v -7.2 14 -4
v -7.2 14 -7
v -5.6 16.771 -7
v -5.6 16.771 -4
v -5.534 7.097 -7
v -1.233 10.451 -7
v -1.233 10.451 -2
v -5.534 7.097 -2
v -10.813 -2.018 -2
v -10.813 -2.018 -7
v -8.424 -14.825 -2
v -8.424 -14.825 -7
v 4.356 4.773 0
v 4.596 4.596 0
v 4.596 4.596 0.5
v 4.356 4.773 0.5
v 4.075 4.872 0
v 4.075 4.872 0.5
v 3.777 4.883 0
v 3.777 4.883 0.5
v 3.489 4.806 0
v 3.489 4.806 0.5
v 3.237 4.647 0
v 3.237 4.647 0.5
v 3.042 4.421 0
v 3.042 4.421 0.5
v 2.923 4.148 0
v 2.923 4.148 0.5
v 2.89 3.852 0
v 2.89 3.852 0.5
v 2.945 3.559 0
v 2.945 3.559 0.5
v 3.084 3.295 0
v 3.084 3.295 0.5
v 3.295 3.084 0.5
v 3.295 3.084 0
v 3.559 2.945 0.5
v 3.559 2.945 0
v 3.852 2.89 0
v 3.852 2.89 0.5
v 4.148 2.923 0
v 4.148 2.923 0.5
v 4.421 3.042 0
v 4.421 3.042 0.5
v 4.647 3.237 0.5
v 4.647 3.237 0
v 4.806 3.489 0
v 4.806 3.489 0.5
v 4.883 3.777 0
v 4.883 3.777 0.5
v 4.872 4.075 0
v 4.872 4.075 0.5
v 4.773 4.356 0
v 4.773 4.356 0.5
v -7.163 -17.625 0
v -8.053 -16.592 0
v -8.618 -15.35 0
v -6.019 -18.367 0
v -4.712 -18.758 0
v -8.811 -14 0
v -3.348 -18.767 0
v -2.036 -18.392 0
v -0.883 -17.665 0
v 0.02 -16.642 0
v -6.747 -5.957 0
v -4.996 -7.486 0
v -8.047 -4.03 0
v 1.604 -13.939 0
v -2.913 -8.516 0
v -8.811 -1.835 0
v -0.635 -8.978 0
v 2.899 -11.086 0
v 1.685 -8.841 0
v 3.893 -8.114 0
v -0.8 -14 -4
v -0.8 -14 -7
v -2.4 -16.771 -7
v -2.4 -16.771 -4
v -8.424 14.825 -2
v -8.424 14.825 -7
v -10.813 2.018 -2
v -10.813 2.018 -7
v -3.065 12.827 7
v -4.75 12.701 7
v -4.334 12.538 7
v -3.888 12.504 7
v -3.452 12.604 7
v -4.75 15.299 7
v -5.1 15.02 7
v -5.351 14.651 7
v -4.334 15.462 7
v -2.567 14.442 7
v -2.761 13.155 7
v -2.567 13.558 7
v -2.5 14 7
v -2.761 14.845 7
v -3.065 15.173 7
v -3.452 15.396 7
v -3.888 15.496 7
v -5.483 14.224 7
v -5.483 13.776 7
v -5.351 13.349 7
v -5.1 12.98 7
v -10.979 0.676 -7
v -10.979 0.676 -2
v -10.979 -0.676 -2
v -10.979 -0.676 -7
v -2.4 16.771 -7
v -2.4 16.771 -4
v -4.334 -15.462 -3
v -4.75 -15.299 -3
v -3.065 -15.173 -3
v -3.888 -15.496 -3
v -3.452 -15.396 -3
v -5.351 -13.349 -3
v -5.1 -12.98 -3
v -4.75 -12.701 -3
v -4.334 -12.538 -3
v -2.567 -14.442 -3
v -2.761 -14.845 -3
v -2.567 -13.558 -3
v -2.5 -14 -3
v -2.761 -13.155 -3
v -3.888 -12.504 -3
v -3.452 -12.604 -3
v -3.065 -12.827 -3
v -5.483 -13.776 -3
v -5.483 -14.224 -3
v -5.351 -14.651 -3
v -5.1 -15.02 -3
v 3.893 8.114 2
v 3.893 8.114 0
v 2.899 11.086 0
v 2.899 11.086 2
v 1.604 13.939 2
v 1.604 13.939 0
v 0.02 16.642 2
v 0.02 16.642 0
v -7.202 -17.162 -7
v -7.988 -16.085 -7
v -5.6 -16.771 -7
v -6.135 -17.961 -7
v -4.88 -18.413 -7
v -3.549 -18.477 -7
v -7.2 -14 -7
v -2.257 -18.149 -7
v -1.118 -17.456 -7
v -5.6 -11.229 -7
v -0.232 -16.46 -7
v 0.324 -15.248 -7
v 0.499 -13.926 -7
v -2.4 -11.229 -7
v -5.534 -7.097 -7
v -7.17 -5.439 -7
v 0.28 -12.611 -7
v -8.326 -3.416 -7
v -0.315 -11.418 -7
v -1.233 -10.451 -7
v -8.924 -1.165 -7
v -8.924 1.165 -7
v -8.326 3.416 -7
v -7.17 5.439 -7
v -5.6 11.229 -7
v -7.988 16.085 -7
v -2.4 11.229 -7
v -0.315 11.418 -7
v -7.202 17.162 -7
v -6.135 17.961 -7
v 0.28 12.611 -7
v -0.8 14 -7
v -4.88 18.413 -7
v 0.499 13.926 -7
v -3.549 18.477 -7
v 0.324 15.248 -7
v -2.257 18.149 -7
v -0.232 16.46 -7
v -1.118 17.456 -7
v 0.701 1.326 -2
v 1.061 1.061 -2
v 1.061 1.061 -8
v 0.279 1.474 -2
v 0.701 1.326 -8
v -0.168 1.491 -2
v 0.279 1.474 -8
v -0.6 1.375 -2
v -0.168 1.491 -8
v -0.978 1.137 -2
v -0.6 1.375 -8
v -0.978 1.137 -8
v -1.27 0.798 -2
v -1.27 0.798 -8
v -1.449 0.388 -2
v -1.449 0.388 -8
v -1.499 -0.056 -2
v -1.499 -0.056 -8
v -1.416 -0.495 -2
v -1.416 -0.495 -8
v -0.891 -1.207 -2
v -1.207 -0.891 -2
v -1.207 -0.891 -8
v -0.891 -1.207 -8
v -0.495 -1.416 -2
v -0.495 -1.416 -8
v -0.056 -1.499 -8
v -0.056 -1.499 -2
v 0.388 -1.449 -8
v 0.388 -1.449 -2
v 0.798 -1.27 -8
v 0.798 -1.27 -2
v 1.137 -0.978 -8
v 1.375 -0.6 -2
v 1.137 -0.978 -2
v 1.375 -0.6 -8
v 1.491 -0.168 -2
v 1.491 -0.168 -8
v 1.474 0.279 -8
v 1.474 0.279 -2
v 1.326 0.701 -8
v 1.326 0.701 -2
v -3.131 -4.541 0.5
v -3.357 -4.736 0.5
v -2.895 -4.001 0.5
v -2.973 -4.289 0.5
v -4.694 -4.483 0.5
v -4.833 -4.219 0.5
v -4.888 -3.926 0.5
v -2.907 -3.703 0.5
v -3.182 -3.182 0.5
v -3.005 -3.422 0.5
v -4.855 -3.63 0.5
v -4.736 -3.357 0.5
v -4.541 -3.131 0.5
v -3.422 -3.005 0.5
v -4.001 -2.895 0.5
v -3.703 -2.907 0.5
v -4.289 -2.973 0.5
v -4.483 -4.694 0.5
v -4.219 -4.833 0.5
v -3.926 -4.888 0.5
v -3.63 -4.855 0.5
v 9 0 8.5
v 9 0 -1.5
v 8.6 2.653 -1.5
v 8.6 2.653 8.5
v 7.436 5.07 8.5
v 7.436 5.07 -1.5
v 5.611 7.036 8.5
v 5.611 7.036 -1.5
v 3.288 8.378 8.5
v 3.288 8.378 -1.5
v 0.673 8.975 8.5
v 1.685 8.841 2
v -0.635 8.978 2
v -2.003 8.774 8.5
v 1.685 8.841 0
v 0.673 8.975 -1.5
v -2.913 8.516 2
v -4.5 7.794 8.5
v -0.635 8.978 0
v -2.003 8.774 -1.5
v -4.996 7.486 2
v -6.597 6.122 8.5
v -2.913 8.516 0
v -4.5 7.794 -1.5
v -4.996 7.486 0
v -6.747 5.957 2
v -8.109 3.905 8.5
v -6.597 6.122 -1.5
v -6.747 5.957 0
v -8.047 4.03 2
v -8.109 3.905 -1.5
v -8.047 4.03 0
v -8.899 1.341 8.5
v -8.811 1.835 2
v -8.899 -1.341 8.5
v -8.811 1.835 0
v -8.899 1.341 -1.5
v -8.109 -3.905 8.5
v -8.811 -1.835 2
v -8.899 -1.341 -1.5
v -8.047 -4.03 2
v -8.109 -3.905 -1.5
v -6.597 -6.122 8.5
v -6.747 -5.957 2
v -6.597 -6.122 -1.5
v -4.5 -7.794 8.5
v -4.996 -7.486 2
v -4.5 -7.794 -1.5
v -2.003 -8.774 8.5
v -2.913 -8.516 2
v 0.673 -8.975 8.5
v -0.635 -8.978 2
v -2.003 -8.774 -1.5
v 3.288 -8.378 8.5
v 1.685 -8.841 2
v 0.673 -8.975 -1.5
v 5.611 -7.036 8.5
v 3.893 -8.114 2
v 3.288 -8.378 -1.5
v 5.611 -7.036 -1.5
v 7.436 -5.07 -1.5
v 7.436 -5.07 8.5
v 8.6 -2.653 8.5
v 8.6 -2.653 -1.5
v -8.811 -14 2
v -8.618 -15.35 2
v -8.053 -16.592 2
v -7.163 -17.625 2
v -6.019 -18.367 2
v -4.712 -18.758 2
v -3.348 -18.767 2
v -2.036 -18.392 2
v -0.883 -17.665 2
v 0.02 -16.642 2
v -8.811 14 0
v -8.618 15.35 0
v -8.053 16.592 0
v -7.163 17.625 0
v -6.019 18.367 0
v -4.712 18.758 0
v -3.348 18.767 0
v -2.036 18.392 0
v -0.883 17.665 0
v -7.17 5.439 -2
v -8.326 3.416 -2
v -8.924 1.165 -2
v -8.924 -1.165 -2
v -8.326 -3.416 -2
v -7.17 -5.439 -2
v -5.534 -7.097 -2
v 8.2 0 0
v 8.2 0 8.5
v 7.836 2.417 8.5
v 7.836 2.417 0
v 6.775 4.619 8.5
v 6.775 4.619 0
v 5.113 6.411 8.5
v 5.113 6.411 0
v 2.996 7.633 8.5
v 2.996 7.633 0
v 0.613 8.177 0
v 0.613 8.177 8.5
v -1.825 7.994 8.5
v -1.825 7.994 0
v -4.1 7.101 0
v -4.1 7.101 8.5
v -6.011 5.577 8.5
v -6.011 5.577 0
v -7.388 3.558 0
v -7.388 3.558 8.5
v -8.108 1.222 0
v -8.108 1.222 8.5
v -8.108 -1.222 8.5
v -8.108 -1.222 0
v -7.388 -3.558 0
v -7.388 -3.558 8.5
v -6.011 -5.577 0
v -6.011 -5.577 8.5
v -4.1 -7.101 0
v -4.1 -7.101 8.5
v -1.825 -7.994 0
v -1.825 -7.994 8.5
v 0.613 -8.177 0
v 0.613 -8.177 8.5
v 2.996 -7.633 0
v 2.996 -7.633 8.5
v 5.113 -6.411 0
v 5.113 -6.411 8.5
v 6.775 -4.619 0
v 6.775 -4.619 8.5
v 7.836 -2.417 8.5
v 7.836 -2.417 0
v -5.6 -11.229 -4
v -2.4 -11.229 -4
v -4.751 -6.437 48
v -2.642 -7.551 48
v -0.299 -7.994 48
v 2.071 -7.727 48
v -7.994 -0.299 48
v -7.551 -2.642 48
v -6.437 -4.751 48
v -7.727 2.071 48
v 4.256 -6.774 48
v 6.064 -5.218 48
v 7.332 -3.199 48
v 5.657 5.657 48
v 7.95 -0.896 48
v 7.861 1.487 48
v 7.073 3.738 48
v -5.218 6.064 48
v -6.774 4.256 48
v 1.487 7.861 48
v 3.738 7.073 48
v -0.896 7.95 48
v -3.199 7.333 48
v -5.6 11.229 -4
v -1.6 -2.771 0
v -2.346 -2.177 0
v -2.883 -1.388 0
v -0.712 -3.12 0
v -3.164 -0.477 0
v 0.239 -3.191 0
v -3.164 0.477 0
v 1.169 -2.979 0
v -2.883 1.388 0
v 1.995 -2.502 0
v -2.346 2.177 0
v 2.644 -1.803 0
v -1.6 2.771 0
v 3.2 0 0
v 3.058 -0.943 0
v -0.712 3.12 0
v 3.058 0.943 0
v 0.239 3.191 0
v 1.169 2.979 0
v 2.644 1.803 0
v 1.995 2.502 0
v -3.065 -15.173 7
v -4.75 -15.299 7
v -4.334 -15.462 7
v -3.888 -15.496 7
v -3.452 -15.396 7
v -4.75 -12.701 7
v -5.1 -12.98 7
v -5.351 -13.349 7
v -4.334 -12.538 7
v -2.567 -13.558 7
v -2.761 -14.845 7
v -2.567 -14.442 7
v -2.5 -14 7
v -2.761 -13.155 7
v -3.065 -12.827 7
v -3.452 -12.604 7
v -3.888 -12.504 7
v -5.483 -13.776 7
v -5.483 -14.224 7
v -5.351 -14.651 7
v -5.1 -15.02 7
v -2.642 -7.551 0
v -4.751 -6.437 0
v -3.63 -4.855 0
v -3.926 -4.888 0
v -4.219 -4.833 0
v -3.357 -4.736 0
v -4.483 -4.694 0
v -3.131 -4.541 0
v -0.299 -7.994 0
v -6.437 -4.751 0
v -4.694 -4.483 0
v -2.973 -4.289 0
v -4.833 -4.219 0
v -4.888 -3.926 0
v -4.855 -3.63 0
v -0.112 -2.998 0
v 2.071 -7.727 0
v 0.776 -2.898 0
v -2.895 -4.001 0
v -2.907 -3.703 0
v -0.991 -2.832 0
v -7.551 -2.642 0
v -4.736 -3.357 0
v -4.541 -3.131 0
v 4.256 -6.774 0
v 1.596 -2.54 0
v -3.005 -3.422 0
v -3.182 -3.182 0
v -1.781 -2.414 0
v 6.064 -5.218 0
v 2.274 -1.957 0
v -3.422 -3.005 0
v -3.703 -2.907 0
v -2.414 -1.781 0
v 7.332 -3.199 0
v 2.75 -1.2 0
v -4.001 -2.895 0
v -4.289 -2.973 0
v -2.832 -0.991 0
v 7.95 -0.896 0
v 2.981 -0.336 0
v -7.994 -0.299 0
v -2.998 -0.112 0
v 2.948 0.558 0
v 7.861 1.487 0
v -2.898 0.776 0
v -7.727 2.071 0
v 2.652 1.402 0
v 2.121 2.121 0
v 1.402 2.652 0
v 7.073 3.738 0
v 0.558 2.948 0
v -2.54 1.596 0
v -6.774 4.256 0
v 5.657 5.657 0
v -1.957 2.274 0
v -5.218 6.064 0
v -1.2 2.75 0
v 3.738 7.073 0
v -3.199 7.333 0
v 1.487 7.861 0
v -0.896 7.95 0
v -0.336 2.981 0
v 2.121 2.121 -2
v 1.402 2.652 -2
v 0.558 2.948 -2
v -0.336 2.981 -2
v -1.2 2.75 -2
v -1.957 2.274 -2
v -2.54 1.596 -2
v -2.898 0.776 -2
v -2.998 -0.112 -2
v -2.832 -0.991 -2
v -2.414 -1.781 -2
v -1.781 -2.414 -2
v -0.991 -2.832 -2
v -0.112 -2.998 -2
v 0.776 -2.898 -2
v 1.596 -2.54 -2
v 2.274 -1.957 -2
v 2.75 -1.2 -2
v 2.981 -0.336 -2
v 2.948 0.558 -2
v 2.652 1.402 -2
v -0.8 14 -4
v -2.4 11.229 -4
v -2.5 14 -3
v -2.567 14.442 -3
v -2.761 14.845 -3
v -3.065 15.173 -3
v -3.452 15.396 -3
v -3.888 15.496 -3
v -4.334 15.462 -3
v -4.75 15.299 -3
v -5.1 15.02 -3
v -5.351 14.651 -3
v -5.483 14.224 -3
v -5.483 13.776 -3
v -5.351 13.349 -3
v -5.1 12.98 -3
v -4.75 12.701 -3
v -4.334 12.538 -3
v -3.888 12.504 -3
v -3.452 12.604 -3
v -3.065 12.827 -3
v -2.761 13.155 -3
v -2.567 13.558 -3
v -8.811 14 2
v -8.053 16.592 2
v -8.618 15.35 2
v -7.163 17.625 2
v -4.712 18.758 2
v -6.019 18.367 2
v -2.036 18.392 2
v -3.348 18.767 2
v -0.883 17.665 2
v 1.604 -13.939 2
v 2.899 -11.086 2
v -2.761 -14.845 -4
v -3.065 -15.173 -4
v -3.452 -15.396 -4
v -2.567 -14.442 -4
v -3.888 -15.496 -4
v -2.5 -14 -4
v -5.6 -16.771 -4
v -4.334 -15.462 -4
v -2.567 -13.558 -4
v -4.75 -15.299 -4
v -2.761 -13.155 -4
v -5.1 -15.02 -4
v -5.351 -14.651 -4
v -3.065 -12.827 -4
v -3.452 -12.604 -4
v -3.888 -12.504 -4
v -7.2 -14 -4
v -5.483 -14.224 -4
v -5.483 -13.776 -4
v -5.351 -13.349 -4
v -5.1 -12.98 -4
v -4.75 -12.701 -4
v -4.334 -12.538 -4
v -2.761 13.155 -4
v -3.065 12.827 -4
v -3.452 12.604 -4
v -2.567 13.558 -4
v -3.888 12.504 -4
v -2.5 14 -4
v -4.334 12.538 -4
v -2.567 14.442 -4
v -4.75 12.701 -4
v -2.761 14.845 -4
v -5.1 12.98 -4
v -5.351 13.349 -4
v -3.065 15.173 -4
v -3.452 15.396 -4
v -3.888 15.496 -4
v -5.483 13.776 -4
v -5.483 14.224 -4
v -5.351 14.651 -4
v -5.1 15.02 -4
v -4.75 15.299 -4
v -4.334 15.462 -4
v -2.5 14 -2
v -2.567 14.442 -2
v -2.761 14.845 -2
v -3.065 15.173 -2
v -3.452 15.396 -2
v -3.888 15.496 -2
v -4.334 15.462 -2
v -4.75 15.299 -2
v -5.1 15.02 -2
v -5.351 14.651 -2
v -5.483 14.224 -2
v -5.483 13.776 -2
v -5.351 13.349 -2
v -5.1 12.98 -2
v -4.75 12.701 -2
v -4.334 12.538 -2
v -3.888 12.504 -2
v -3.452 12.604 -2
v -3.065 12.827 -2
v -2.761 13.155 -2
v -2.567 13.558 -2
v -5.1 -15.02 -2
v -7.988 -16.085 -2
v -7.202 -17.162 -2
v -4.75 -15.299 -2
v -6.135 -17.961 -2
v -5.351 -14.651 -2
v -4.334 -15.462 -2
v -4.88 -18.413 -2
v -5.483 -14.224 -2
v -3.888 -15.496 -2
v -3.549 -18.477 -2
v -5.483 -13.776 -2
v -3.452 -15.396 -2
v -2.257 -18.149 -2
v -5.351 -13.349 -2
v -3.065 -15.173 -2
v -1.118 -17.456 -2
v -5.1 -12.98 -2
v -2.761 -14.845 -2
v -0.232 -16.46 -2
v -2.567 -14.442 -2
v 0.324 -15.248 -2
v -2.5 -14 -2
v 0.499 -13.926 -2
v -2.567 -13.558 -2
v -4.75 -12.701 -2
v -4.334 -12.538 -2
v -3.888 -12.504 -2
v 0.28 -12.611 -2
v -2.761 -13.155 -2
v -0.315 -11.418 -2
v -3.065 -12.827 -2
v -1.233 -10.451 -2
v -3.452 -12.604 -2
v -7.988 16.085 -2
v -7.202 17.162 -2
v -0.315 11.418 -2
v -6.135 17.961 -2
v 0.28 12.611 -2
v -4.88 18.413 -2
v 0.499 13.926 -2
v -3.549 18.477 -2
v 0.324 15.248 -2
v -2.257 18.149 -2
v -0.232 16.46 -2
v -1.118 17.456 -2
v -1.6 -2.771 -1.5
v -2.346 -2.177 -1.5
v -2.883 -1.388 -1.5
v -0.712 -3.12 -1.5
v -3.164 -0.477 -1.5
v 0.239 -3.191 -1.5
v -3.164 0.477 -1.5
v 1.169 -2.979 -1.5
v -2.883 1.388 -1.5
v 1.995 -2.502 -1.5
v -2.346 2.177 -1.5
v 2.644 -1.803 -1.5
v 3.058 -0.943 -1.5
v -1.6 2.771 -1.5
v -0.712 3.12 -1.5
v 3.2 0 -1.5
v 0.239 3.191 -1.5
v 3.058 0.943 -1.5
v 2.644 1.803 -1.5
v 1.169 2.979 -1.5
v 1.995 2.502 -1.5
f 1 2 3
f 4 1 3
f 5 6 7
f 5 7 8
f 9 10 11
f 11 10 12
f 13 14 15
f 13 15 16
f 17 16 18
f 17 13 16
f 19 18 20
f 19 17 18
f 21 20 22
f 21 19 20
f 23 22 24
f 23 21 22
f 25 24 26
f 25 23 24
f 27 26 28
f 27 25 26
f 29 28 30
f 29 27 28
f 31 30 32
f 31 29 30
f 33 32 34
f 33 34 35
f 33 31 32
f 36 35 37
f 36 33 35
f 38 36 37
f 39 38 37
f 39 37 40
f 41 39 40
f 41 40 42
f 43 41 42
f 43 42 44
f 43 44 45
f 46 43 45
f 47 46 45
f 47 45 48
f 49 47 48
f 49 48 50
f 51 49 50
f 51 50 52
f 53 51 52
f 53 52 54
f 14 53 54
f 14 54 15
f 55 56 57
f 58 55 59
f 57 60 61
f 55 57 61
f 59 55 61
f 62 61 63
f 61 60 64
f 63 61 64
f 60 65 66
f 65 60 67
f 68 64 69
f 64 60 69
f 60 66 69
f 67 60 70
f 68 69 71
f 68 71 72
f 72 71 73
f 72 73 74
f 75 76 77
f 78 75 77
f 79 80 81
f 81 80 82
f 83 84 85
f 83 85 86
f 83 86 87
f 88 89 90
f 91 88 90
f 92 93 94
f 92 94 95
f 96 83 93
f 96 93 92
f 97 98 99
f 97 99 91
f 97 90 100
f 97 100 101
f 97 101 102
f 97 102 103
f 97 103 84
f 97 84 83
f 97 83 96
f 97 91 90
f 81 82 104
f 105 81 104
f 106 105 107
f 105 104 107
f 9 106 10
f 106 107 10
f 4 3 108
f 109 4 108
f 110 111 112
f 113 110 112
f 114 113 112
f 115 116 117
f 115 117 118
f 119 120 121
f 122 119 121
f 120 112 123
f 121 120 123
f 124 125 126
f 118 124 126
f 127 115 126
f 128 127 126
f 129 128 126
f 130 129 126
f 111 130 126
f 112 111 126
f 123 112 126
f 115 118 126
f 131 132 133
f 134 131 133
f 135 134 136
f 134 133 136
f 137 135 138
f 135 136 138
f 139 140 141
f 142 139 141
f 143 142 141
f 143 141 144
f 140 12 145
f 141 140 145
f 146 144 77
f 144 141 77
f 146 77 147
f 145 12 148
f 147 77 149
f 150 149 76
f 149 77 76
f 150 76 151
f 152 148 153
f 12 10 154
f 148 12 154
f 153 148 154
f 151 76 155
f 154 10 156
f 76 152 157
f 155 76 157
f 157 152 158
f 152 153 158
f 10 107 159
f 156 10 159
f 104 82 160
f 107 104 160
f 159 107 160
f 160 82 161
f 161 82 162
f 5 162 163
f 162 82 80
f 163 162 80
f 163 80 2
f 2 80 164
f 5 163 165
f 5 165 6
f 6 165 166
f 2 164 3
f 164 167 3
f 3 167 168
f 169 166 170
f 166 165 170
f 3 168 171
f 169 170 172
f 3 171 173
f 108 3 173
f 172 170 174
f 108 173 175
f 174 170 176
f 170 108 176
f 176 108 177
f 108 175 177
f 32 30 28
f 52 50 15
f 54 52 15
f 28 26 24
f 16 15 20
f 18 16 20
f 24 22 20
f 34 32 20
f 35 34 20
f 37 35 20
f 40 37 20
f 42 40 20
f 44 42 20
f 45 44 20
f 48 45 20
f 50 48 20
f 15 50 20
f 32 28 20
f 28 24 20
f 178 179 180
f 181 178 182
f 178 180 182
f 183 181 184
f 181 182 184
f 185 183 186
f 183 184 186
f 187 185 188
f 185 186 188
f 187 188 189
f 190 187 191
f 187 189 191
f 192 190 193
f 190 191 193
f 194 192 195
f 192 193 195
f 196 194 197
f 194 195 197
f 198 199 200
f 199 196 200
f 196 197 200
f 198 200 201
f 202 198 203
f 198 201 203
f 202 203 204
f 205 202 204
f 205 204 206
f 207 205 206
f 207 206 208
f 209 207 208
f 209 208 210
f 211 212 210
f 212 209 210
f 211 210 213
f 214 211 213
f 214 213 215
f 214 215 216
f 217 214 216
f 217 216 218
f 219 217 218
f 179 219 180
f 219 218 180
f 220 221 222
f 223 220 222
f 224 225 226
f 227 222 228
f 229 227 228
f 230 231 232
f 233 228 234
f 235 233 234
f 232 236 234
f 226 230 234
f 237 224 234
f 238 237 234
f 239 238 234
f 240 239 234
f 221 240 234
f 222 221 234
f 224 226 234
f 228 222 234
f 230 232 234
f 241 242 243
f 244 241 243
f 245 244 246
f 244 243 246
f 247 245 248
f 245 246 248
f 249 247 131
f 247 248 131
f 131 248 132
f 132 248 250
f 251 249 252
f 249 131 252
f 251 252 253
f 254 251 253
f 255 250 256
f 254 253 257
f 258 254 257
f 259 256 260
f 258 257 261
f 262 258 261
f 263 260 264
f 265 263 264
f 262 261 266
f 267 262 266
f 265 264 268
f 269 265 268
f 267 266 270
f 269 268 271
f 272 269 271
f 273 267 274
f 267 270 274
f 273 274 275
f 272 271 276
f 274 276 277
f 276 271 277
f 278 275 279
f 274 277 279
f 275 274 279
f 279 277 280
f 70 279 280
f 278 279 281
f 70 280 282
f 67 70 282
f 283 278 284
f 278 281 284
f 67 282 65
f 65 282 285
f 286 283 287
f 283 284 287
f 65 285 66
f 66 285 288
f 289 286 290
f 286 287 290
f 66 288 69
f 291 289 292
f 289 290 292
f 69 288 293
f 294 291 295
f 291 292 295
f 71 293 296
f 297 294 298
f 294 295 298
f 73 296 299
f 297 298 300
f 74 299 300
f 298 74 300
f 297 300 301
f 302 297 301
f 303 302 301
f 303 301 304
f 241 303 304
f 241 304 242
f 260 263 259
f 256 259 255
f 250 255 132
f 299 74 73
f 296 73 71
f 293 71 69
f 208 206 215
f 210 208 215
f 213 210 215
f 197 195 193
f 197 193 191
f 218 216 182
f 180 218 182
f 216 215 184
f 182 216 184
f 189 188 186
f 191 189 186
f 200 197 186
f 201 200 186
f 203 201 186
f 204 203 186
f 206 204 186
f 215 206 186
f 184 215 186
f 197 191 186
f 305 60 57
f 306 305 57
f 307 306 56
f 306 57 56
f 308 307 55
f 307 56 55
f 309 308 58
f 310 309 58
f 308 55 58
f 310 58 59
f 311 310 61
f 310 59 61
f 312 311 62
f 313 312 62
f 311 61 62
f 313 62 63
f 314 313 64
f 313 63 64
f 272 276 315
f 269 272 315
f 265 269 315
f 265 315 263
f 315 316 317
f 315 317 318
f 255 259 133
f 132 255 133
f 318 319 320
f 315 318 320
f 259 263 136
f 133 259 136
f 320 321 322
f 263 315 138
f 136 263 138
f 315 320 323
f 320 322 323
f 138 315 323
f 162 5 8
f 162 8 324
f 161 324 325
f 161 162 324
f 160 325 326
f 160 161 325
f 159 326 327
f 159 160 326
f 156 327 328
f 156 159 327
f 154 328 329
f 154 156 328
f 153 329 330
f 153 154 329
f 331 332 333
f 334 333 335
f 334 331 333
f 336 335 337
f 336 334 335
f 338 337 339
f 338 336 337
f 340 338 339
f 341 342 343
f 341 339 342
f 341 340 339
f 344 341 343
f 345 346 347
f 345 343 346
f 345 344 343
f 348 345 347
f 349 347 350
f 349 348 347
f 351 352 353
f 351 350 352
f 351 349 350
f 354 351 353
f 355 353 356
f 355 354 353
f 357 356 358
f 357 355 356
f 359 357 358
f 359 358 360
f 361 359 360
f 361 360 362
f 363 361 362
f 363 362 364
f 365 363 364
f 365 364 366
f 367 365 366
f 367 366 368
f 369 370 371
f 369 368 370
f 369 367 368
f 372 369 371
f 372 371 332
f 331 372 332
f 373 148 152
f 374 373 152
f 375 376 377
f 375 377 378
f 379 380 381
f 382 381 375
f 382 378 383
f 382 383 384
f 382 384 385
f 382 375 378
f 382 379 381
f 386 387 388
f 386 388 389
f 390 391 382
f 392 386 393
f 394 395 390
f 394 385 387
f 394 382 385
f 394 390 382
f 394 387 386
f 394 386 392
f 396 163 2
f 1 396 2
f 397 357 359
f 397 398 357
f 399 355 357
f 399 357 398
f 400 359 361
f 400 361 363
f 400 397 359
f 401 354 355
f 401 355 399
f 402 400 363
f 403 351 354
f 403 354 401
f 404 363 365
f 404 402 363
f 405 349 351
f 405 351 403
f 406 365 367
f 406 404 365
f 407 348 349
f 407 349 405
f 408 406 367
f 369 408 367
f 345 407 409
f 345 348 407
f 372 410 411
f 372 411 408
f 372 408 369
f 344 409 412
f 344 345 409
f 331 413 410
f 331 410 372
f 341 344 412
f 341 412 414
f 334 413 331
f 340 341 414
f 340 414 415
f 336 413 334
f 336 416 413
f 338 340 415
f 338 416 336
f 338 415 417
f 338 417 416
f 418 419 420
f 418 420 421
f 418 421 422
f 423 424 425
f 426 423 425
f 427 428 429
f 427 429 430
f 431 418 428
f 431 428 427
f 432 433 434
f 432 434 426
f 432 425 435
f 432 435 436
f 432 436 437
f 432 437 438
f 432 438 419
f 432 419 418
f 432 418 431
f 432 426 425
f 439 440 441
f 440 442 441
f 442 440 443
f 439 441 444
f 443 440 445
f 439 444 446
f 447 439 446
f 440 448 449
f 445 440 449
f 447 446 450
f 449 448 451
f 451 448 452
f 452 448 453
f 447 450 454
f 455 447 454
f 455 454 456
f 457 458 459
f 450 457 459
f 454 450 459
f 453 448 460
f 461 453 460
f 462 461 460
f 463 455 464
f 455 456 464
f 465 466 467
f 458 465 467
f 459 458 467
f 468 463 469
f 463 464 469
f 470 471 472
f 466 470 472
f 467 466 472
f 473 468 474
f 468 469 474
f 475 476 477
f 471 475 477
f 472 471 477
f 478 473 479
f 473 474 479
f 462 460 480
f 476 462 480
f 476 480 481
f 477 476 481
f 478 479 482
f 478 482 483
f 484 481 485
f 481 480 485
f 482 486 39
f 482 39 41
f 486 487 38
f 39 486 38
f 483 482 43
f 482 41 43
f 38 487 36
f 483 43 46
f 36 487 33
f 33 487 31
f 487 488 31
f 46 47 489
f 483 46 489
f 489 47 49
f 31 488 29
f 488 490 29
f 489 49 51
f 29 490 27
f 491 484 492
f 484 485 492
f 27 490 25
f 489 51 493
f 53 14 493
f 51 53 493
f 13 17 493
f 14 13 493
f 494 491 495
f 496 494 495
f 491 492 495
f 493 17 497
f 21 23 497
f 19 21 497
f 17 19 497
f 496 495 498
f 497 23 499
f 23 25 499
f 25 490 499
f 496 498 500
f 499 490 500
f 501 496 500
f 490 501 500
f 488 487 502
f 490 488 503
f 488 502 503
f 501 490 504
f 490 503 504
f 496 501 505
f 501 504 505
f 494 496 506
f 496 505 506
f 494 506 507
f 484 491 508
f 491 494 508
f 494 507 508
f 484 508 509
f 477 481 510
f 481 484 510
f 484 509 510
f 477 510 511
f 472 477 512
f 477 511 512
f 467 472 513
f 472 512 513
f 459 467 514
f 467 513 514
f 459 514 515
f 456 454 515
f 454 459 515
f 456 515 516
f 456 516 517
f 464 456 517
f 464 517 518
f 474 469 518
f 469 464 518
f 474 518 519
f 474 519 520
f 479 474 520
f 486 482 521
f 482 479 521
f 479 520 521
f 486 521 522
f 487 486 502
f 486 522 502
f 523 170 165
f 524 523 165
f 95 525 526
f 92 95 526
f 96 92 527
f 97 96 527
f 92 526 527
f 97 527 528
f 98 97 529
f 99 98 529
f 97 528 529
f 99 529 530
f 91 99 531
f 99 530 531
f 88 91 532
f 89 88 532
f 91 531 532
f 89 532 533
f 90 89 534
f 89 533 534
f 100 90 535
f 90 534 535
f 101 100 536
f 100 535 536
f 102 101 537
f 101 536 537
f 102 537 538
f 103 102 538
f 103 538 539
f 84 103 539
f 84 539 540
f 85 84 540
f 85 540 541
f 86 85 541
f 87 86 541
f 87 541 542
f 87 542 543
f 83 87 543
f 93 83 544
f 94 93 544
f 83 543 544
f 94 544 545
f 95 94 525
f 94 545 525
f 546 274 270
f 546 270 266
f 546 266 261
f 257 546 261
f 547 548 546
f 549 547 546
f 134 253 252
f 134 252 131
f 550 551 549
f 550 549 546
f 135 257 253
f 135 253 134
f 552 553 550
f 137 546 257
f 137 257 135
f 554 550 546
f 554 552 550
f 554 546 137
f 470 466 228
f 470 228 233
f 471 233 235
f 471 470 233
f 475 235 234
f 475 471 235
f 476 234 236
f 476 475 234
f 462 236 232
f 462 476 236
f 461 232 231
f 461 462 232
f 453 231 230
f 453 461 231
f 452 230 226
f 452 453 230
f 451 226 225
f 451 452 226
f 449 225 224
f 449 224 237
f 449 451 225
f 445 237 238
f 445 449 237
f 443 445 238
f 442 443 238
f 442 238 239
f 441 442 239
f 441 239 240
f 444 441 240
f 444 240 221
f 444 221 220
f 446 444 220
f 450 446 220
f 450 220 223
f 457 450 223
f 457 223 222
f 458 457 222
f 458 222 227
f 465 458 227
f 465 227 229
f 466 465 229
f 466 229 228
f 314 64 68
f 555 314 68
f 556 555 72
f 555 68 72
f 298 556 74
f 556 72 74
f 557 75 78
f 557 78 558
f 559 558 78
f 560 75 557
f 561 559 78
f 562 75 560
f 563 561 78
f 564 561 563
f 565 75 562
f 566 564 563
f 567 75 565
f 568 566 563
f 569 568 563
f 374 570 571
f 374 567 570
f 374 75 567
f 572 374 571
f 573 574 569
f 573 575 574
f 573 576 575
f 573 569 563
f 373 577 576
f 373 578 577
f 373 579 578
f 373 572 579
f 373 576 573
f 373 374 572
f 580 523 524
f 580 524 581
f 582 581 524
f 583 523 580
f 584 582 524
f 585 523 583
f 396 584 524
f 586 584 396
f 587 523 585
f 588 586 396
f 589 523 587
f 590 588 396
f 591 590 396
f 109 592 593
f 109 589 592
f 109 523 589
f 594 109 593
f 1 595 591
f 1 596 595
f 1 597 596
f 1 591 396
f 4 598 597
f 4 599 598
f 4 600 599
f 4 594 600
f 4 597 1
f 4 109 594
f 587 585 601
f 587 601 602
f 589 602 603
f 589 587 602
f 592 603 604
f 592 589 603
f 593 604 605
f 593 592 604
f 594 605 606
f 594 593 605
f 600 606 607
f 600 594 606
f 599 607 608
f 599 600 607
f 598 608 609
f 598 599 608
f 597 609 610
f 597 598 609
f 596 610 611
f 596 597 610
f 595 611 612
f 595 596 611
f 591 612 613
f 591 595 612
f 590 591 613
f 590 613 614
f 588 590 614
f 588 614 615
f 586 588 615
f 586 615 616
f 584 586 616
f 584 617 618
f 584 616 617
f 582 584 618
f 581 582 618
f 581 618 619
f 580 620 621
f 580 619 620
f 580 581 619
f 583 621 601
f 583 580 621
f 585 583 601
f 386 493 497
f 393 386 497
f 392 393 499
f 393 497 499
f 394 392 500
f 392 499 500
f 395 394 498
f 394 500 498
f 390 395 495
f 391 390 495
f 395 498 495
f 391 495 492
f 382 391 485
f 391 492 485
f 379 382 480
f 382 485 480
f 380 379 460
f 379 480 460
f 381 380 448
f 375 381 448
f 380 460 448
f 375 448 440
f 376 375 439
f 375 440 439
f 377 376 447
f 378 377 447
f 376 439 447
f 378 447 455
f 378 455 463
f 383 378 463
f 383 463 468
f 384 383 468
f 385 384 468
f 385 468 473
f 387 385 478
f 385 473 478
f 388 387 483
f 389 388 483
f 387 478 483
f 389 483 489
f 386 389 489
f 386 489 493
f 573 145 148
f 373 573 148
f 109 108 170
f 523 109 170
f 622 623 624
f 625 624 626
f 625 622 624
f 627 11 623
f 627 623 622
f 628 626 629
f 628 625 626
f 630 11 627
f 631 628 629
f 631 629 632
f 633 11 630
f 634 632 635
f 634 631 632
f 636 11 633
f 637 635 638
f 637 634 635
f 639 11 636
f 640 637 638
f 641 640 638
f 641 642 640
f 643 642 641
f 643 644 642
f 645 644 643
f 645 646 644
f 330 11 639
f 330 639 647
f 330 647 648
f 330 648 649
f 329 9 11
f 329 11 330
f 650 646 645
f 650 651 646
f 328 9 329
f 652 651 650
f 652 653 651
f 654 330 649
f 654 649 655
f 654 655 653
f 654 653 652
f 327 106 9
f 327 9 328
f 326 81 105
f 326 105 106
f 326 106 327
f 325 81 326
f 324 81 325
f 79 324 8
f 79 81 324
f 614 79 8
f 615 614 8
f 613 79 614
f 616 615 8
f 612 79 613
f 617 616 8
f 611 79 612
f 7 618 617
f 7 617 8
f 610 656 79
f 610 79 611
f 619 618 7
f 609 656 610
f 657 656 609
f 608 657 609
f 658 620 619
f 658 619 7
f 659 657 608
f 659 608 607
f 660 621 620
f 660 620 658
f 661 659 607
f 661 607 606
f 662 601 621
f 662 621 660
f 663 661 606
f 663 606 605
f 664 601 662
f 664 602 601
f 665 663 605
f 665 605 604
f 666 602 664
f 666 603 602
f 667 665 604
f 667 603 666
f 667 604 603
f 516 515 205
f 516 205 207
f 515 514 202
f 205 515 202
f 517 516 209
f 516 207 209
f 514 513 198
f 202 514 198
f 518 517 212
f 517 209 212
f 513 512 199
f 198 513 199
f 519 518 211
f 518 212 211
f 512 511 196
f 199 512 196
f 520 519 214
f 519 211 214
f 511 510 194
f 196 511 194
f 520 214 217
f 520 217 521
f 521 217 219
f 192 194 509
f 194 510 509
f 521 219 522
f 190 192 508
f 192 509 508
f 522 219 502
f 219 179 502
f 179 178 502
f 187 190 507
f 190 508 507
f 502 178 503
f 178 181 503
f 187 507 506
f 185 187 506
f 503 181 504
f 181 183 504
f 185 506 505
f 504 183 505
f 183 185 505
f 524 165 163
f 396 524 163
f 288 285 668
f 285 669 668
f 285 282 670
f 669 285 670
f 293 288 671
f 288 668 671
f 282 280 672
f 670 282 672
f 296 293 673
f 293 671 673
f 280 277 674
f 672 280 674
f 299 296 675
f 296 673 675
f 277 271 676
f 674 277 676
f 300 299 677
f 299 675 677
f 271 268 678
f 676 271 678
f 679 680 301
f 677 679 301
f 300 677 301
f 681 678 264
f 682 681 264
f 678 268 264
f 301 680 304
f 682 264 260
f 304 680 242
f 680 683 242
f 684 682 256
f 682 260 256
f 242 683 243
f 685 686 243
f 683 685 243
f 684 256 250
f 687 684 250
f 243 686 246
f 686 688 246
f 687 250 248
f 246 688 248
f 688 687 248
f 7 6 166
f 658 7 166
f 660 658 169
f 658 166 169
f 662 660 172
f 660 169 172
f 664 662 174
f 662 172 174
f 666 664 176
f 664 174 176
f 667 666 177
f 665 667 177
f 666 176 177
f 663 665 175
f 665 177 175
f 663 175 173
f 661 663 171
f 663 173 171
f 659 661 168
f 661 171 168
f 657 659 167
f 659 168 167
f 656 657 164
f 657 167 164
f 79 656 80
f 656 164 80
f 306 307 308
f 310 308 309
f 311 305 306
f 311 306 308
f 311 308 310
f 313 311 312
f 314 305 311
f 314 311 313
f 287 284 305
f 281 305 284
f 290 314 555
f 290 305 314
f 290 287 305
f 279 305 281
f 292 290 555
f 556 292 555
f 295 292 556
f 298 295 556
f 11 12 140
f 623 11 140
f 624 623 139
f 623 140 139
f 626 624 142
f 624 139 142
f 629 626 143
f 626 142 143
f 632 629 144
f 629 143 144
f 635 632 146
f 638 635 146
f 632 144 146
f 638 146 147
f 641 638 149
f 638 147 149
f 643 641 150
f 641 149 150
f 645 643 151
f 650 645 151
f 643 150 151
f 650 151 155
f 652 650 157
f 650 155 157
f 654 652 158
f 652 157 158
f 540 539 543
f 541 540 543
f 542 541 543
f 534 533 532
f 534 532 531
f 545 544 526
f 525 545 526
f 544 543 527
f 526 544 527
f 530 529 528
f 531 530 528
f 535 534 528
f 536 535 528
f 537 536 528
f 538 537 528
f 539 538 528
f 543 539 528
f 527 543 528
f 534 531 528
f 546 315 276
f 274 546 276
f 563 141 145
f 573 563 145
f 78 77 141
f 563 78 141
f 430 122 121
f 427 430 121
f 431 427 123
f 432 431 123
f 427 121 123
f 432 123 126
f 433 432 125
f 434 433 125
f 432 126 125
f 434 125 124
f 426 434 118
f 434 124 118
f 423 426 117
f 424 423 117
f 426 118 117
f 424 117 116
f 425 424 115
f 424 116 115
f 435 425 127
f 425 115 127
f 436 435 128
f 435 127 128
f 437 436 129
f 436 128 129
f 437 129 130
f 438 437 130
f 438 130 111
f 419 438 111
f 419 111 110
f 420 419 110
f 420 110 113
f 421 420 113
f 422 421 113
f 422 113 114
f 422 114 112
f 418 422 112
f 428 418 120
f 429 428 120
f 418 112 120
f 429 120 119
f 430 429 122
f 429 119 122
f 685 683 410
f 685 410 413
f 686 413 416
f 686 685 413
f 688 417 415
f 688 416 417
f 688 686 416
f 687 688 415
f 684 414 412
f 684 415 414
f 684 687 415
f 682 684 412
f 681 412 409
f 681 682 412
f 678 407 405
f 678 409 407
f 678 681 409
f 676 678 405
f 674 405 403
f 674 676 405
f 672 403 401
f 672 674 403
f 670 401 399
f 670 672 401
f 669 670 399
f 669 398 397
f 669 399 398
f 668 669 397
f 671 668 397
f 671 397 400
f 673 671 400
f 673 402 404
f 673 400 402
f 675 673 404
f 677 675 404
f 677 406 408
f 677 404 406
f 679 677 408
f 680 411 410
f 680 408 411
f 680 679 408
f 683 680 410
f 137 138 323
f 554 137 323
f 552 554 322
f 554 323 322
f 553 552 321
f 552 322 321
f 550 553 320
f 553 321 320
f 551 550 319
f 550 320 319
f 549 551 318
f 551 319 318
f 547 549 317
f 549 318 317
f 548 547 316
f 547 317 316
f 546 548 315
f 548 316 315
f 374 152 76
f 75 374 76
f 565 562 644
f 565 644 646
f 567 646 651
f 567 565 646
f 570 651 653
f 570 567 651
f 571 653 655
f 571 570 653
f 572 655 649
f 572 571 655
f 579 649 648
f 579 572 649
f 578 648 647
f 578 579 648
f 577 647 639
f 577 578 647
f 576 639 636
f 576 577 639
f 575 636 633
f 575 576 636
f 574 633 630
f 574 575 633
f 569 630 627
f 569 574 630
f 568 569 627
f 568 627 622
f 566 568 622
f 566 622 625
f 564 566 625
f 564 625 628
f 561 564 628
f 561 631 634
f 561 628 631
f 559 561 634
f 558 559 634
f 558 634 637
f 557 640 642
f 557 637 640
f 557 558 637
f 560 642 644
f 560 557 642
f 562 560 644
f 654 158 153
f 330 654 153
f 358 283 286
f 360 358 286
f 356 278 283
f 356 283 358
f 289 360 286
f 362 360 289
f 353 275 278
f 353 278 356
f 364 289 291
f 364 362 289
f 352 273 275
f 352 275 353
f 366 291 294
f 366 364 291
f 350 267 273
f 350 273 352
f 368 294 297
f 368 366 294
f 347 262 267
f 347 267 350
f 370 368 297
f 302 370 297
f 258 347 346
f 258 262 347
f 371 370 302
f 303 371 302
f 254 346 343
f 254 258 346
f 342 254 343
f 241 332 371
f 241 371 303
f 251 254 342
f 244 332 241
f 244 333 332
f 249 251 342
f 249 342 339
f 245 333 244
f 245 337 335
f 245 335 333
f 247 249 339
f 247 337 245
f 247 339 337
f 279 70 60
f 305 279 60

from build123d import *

# Parameters (mm, degrees)
CYLINDER002_R          = 3
CYLINDER002_DEPTH      = 2.5
CYLINDER004_R          = 1
CYLINDER004_DEPTH      = 8.5
CYLINDER003_R          = 1
CYLINDER003_DEPTH      = 8.5
CYLINDER_R             = 8
CYLINDER_DEPTH         = 48
CYLINDER001_R          = 1.5
CYLINDER001_DEPTH      = 8
FUSION_PLACEMENT_ANGLE = 44.999934
EXTRUDE_DEPTH          = 10
CYLINDER006_R          = 1.5
CYLINDER006_DEPTH      = 10
EXTRUDE001_DEPTH       = 10
CYLINDER005_R          = 1.5
CYLINDER005_DEPTH      = 10
EXTRUDE002_DEPTH       = 5
CYLINDER010_R          = 1.5
CYLINDER010_DEPTH      = 10
CYLINDER011_R          = 1.5
CYLINDER011_DEPTH      = 10
CYLINDER009_R          = 3.2
CYLINDER009_DEPTH      = 10
CYLINDER008_R          = 8.2
CYLINDER008_DEPTH      = 10
EXTRUDE003_DEPTH       = 2
CYLINDER007_R          = 9
CYLINDER007_DEPTH      = 10


with BuildPart() as bearing:
    # Cylinder002 → Cylinder002 (new body)
    with BuildSketch(Plane.XY.offset(-2)):
        Circle(CYLINDER002_R)
    extrude(amount=CYLINDER002_DEPTH)


with BuildPart() as cylinder004:
    # Cylinder004 → Cylinder004 (new body)
    with BuildSketch(Plane(origin=(-5.5, 0, -8), x_dir=(1, 0, 0), z_dir=(0, 0, 1))):
        Circle(CYLINDER004_R)
    extrude(amount=CYLINDER004_DEPTH)


with BuildPart() as cylinder003:
    # Cylinder003 → Cylinder003 (new body)
    with BuildSketch(Plane(origin=(5.5, 0, -8), x_dir=(1, 0, 0), z_dir=(0, 0, 1))):
        Circle(CYLINDER003_R)
    extrude(amount=CYLINDER003_DEPTH)


with BuildPart() as cut001:
    # Cylinder → Cylinder (new body)
    with BuildSketch(Plane.XY):
        Circle(CYLINDER_R)
    extrude(amount=CYLINDER_DEPTH)

    # Cut: cut Cylinder003
    add(cylinder003.part, mode=Mode.SUBTRACT)

    # Cut001: cut Cylinder004
    add(cylinder004.part, mode=Mode.SUBTRACT)


with BuildPart() as fusion:
    # Cylinder001 → Cylinder001 (new body)
    with BuildSketch(Plane.XY.offset(-8)):
        Circle(CYLINDER001_R)
    extrude(amount=CYLINDER001_DEPTH)

    # Fusion: union bearing, Cut001
    add(bearing.part)
    add(cut001.part)


with BuildPart() as fusion_1:
    # Fusion placement: moved
    add(fusion.part.rotate(Axis((0, 0, 0), (0, 0, 1)), FUSION_PLACEMENT_ANGLE))


with BuildPart() as m3nuttrapa:
    # Sketch → Extrude (new body)
    with BuildSketch(Plane.XY):
        Polygon((-1.6, 2.771281), (1.6, 2.771281), (3.2, 0), (1.6, -2.771281), (-1.6, -2.771281), (-3.2, 0), align=None)
    extrude(amount=EXTRUDE_DEPTH)


with BuildPart() as m3nuttrapa_1:
    # Extrude placement: moved
    add(m3nuttrapa.part.moved(Location((0, 14, -12))))


with BuildPart() as nuttrapcutoutb:
    # Cylinder006 → Cylinder006 (new body)
    with BuildSketch(Plane(origin=(0, 14, -3), x_dir=(1, 0, 0), z_dir=(0, 0, 1))):
        Circle(CYLINDER006_R)
    extrude(amount=CYLINDER006_DEPTH)

    # Fusion001: union M3NutTrapA
    add(m3nuttrapa_1.part)


with BuildPart() as nuttrapcutoutb_1:
    # Fusion001 placement: moved
    add(nuttrapcutoutb.part.moved(Location((-4, 0, 0))))


with BuildPart() as m3nuttrapb:
    # Sketch → Extrude001 (new body)
    with BuildSketch(Plane.XY):
        Polygon((-1.6, 2.771281), (1.6, 2.771281), (3.2, 0), (1.6, -2.771281), (-1.6, -2.771281), (-3.2, 0), align=None)
    extrude(amount=EXTRUDE001_DEPTH)


with BuildPart() as m3nuttrapb_1:
    # Extrude001 placement: moved
    add(m3nuttrapb.part.moved(Location((0, -14, -12))))


with BuildPart() as nuttrapcutouta:
    # Cylinder005 → Cylinder005 (new body)
    with BuildSketch(Plane(origin=(0, -14, -3), x_dir=(1, 0, 0), z_dir=(0, 0, 1))):
        Circle(CYLINDER005_R)
    extrude(amount=CYLINDER005_DEPTH)

    # Fusion002: union M3NutTrapB
    add(m3nuttrapb_1.part)


with BuildPart() as nuttrapcutouta_1:
    # Fusion002 placement: moved
    add(nuttrapcutouta.part.moved(Location((-4, 0, 0))))


with BuildPart() as motorretainernuttrap:
    # Sketch001 → Extrude002 (new body)
    with BuildSketch(Plane.XY):
        with BuildLine():
            ThreePointArc((-10.813384, 2.017605), (-11, -3e-06), (-10.813383, -2.01761))
            Line((-10.813383, -2.01761), (-8.423655, -14.825397))
            ThreePointArc((-8.423655, -14.825397), (-1.661375, -17.844585), (-1.232891, -10.451323))
            Line((-1.232891, -10.451323), (-5.534189, -7.097377))
            ThreePointArc((-5.534193, 7.097373), (-9, -3e-06), (-5.534189, -7.097377))
            Line((-1.232904, 10.451313), (-5.534193, 7.097373))
            ThreePointArc((-1.232904, 10.451313), (-1.661374, 17.844584), (-8.423657, 14.825384))
            Line((-8.423657, 14.825384), (-10.813384, 2.017605))
        make_face()
    extrude(amount=EXTRUDE002_DEPTH)


with BuildPart() as motorretainernuttrap_1:
    # Extrude002 placement: moved
    add(motorretainernuttrap.part.moved(Location((0, 0, -5))))

    # Cut002: cut NutTrapCutoutA
    add(nuttrapcutouta_1.part, mode=Mode.SUBTRACT)

    # Cut003: cut NutTrapCutoutB
    add(nuttrapcutoutb_1.part, mode=Mode.SUBTRACT)


with BuildPart() as motorretainernuttrap_2:
    # Cut003 placement: moved
    add(motorretainernuttrap_1.part.moved(Location((0, 0, -2))))


with BuildPart() as boltcylindera:
    # Cylinder010 → Cylinder010 (new body)
    with BuildSketch(Plane(origin=(-4, 14, -3), x_dir=(1, 0, 0), z_dir=(0, 0, 1))):
        Circle(CYLINDER010_R)
    extrude(amount=CYLINDER010_DEPTH)


with BuildPart() as boltcylinderb:
    # Cylinder011 → Cylinder011 (new body)
    with BuildSketch(Plane(origin=(-4, -14, -3), x_dir=(1, 0, 0), z_dir=(0, 0, 1))):
        Circle(CYLINDER011_R)
    extrude(amount=CYLINDER011_DEPTH)


with BuildPart() as oversizemotorbearing:
    # Cylinder009 → Cylinder009 (new body)
    with BuildSketch(Plane.XY.offset(-6)):
        Circle(CYLINDER009_R)
    extrude(amount=CYLINDER009_DEPTH)


with BuildPart() as oversizemotor:
    # Cylinder008 → Cylinder008 (new body)
    with BuildSketch(Plane.XY):
        Circle(CYLINDER008_R)
    extrude(amount=CYLINDER008_DEPTH)

    # Fusion004: union OversizeMotorBearing
    add(oversizemotorbearing.part)


with BuildPart() as motortopbracket:
    # Sketch002 → Extrude003 (new body)
    with BuildSketch(Plane.XY):
        with BuildLine():
            ThreePointArc((0.020318, 16.642461), (-5.379113, 18.609078), (-8.810983, 13.999989))
            Line((-8.810983, 13.999989), (-8.810983, -13.999978))
            ThreePointArc((-8.810983, -13.999978), (-5.379107, -18.60908), (0.02033, -16.642442))
            ThreePointArc((0.02033, -16.642442), (5, 1.1e-05), (0.020318, 16.642461))
        make_face()
    extrude(amount=EXTRUDE003_DEPTH)


with BuildPart() as motortopbracket002:
    # Cylinder007 → Cylinder007 (new body)
    with BuildSketch(Plane.XY.offset(-1.5)):
        Circle(CYLINDER007_R)
    extrude(amount=CYLINDER007_DEPTH)

    # Fusion005: union MotorTopBracket
    add(motortopbracket.part)

    # Cut004: cut OversizeMotor
    add(oversizemotor.part, mode=Mode.SUBTRACT)


solid = Compound([fusion_1.part, motorretainernuttrap_2.part, boltcylindera.part, boltcylinderb.part, motortopbracket002.part])
